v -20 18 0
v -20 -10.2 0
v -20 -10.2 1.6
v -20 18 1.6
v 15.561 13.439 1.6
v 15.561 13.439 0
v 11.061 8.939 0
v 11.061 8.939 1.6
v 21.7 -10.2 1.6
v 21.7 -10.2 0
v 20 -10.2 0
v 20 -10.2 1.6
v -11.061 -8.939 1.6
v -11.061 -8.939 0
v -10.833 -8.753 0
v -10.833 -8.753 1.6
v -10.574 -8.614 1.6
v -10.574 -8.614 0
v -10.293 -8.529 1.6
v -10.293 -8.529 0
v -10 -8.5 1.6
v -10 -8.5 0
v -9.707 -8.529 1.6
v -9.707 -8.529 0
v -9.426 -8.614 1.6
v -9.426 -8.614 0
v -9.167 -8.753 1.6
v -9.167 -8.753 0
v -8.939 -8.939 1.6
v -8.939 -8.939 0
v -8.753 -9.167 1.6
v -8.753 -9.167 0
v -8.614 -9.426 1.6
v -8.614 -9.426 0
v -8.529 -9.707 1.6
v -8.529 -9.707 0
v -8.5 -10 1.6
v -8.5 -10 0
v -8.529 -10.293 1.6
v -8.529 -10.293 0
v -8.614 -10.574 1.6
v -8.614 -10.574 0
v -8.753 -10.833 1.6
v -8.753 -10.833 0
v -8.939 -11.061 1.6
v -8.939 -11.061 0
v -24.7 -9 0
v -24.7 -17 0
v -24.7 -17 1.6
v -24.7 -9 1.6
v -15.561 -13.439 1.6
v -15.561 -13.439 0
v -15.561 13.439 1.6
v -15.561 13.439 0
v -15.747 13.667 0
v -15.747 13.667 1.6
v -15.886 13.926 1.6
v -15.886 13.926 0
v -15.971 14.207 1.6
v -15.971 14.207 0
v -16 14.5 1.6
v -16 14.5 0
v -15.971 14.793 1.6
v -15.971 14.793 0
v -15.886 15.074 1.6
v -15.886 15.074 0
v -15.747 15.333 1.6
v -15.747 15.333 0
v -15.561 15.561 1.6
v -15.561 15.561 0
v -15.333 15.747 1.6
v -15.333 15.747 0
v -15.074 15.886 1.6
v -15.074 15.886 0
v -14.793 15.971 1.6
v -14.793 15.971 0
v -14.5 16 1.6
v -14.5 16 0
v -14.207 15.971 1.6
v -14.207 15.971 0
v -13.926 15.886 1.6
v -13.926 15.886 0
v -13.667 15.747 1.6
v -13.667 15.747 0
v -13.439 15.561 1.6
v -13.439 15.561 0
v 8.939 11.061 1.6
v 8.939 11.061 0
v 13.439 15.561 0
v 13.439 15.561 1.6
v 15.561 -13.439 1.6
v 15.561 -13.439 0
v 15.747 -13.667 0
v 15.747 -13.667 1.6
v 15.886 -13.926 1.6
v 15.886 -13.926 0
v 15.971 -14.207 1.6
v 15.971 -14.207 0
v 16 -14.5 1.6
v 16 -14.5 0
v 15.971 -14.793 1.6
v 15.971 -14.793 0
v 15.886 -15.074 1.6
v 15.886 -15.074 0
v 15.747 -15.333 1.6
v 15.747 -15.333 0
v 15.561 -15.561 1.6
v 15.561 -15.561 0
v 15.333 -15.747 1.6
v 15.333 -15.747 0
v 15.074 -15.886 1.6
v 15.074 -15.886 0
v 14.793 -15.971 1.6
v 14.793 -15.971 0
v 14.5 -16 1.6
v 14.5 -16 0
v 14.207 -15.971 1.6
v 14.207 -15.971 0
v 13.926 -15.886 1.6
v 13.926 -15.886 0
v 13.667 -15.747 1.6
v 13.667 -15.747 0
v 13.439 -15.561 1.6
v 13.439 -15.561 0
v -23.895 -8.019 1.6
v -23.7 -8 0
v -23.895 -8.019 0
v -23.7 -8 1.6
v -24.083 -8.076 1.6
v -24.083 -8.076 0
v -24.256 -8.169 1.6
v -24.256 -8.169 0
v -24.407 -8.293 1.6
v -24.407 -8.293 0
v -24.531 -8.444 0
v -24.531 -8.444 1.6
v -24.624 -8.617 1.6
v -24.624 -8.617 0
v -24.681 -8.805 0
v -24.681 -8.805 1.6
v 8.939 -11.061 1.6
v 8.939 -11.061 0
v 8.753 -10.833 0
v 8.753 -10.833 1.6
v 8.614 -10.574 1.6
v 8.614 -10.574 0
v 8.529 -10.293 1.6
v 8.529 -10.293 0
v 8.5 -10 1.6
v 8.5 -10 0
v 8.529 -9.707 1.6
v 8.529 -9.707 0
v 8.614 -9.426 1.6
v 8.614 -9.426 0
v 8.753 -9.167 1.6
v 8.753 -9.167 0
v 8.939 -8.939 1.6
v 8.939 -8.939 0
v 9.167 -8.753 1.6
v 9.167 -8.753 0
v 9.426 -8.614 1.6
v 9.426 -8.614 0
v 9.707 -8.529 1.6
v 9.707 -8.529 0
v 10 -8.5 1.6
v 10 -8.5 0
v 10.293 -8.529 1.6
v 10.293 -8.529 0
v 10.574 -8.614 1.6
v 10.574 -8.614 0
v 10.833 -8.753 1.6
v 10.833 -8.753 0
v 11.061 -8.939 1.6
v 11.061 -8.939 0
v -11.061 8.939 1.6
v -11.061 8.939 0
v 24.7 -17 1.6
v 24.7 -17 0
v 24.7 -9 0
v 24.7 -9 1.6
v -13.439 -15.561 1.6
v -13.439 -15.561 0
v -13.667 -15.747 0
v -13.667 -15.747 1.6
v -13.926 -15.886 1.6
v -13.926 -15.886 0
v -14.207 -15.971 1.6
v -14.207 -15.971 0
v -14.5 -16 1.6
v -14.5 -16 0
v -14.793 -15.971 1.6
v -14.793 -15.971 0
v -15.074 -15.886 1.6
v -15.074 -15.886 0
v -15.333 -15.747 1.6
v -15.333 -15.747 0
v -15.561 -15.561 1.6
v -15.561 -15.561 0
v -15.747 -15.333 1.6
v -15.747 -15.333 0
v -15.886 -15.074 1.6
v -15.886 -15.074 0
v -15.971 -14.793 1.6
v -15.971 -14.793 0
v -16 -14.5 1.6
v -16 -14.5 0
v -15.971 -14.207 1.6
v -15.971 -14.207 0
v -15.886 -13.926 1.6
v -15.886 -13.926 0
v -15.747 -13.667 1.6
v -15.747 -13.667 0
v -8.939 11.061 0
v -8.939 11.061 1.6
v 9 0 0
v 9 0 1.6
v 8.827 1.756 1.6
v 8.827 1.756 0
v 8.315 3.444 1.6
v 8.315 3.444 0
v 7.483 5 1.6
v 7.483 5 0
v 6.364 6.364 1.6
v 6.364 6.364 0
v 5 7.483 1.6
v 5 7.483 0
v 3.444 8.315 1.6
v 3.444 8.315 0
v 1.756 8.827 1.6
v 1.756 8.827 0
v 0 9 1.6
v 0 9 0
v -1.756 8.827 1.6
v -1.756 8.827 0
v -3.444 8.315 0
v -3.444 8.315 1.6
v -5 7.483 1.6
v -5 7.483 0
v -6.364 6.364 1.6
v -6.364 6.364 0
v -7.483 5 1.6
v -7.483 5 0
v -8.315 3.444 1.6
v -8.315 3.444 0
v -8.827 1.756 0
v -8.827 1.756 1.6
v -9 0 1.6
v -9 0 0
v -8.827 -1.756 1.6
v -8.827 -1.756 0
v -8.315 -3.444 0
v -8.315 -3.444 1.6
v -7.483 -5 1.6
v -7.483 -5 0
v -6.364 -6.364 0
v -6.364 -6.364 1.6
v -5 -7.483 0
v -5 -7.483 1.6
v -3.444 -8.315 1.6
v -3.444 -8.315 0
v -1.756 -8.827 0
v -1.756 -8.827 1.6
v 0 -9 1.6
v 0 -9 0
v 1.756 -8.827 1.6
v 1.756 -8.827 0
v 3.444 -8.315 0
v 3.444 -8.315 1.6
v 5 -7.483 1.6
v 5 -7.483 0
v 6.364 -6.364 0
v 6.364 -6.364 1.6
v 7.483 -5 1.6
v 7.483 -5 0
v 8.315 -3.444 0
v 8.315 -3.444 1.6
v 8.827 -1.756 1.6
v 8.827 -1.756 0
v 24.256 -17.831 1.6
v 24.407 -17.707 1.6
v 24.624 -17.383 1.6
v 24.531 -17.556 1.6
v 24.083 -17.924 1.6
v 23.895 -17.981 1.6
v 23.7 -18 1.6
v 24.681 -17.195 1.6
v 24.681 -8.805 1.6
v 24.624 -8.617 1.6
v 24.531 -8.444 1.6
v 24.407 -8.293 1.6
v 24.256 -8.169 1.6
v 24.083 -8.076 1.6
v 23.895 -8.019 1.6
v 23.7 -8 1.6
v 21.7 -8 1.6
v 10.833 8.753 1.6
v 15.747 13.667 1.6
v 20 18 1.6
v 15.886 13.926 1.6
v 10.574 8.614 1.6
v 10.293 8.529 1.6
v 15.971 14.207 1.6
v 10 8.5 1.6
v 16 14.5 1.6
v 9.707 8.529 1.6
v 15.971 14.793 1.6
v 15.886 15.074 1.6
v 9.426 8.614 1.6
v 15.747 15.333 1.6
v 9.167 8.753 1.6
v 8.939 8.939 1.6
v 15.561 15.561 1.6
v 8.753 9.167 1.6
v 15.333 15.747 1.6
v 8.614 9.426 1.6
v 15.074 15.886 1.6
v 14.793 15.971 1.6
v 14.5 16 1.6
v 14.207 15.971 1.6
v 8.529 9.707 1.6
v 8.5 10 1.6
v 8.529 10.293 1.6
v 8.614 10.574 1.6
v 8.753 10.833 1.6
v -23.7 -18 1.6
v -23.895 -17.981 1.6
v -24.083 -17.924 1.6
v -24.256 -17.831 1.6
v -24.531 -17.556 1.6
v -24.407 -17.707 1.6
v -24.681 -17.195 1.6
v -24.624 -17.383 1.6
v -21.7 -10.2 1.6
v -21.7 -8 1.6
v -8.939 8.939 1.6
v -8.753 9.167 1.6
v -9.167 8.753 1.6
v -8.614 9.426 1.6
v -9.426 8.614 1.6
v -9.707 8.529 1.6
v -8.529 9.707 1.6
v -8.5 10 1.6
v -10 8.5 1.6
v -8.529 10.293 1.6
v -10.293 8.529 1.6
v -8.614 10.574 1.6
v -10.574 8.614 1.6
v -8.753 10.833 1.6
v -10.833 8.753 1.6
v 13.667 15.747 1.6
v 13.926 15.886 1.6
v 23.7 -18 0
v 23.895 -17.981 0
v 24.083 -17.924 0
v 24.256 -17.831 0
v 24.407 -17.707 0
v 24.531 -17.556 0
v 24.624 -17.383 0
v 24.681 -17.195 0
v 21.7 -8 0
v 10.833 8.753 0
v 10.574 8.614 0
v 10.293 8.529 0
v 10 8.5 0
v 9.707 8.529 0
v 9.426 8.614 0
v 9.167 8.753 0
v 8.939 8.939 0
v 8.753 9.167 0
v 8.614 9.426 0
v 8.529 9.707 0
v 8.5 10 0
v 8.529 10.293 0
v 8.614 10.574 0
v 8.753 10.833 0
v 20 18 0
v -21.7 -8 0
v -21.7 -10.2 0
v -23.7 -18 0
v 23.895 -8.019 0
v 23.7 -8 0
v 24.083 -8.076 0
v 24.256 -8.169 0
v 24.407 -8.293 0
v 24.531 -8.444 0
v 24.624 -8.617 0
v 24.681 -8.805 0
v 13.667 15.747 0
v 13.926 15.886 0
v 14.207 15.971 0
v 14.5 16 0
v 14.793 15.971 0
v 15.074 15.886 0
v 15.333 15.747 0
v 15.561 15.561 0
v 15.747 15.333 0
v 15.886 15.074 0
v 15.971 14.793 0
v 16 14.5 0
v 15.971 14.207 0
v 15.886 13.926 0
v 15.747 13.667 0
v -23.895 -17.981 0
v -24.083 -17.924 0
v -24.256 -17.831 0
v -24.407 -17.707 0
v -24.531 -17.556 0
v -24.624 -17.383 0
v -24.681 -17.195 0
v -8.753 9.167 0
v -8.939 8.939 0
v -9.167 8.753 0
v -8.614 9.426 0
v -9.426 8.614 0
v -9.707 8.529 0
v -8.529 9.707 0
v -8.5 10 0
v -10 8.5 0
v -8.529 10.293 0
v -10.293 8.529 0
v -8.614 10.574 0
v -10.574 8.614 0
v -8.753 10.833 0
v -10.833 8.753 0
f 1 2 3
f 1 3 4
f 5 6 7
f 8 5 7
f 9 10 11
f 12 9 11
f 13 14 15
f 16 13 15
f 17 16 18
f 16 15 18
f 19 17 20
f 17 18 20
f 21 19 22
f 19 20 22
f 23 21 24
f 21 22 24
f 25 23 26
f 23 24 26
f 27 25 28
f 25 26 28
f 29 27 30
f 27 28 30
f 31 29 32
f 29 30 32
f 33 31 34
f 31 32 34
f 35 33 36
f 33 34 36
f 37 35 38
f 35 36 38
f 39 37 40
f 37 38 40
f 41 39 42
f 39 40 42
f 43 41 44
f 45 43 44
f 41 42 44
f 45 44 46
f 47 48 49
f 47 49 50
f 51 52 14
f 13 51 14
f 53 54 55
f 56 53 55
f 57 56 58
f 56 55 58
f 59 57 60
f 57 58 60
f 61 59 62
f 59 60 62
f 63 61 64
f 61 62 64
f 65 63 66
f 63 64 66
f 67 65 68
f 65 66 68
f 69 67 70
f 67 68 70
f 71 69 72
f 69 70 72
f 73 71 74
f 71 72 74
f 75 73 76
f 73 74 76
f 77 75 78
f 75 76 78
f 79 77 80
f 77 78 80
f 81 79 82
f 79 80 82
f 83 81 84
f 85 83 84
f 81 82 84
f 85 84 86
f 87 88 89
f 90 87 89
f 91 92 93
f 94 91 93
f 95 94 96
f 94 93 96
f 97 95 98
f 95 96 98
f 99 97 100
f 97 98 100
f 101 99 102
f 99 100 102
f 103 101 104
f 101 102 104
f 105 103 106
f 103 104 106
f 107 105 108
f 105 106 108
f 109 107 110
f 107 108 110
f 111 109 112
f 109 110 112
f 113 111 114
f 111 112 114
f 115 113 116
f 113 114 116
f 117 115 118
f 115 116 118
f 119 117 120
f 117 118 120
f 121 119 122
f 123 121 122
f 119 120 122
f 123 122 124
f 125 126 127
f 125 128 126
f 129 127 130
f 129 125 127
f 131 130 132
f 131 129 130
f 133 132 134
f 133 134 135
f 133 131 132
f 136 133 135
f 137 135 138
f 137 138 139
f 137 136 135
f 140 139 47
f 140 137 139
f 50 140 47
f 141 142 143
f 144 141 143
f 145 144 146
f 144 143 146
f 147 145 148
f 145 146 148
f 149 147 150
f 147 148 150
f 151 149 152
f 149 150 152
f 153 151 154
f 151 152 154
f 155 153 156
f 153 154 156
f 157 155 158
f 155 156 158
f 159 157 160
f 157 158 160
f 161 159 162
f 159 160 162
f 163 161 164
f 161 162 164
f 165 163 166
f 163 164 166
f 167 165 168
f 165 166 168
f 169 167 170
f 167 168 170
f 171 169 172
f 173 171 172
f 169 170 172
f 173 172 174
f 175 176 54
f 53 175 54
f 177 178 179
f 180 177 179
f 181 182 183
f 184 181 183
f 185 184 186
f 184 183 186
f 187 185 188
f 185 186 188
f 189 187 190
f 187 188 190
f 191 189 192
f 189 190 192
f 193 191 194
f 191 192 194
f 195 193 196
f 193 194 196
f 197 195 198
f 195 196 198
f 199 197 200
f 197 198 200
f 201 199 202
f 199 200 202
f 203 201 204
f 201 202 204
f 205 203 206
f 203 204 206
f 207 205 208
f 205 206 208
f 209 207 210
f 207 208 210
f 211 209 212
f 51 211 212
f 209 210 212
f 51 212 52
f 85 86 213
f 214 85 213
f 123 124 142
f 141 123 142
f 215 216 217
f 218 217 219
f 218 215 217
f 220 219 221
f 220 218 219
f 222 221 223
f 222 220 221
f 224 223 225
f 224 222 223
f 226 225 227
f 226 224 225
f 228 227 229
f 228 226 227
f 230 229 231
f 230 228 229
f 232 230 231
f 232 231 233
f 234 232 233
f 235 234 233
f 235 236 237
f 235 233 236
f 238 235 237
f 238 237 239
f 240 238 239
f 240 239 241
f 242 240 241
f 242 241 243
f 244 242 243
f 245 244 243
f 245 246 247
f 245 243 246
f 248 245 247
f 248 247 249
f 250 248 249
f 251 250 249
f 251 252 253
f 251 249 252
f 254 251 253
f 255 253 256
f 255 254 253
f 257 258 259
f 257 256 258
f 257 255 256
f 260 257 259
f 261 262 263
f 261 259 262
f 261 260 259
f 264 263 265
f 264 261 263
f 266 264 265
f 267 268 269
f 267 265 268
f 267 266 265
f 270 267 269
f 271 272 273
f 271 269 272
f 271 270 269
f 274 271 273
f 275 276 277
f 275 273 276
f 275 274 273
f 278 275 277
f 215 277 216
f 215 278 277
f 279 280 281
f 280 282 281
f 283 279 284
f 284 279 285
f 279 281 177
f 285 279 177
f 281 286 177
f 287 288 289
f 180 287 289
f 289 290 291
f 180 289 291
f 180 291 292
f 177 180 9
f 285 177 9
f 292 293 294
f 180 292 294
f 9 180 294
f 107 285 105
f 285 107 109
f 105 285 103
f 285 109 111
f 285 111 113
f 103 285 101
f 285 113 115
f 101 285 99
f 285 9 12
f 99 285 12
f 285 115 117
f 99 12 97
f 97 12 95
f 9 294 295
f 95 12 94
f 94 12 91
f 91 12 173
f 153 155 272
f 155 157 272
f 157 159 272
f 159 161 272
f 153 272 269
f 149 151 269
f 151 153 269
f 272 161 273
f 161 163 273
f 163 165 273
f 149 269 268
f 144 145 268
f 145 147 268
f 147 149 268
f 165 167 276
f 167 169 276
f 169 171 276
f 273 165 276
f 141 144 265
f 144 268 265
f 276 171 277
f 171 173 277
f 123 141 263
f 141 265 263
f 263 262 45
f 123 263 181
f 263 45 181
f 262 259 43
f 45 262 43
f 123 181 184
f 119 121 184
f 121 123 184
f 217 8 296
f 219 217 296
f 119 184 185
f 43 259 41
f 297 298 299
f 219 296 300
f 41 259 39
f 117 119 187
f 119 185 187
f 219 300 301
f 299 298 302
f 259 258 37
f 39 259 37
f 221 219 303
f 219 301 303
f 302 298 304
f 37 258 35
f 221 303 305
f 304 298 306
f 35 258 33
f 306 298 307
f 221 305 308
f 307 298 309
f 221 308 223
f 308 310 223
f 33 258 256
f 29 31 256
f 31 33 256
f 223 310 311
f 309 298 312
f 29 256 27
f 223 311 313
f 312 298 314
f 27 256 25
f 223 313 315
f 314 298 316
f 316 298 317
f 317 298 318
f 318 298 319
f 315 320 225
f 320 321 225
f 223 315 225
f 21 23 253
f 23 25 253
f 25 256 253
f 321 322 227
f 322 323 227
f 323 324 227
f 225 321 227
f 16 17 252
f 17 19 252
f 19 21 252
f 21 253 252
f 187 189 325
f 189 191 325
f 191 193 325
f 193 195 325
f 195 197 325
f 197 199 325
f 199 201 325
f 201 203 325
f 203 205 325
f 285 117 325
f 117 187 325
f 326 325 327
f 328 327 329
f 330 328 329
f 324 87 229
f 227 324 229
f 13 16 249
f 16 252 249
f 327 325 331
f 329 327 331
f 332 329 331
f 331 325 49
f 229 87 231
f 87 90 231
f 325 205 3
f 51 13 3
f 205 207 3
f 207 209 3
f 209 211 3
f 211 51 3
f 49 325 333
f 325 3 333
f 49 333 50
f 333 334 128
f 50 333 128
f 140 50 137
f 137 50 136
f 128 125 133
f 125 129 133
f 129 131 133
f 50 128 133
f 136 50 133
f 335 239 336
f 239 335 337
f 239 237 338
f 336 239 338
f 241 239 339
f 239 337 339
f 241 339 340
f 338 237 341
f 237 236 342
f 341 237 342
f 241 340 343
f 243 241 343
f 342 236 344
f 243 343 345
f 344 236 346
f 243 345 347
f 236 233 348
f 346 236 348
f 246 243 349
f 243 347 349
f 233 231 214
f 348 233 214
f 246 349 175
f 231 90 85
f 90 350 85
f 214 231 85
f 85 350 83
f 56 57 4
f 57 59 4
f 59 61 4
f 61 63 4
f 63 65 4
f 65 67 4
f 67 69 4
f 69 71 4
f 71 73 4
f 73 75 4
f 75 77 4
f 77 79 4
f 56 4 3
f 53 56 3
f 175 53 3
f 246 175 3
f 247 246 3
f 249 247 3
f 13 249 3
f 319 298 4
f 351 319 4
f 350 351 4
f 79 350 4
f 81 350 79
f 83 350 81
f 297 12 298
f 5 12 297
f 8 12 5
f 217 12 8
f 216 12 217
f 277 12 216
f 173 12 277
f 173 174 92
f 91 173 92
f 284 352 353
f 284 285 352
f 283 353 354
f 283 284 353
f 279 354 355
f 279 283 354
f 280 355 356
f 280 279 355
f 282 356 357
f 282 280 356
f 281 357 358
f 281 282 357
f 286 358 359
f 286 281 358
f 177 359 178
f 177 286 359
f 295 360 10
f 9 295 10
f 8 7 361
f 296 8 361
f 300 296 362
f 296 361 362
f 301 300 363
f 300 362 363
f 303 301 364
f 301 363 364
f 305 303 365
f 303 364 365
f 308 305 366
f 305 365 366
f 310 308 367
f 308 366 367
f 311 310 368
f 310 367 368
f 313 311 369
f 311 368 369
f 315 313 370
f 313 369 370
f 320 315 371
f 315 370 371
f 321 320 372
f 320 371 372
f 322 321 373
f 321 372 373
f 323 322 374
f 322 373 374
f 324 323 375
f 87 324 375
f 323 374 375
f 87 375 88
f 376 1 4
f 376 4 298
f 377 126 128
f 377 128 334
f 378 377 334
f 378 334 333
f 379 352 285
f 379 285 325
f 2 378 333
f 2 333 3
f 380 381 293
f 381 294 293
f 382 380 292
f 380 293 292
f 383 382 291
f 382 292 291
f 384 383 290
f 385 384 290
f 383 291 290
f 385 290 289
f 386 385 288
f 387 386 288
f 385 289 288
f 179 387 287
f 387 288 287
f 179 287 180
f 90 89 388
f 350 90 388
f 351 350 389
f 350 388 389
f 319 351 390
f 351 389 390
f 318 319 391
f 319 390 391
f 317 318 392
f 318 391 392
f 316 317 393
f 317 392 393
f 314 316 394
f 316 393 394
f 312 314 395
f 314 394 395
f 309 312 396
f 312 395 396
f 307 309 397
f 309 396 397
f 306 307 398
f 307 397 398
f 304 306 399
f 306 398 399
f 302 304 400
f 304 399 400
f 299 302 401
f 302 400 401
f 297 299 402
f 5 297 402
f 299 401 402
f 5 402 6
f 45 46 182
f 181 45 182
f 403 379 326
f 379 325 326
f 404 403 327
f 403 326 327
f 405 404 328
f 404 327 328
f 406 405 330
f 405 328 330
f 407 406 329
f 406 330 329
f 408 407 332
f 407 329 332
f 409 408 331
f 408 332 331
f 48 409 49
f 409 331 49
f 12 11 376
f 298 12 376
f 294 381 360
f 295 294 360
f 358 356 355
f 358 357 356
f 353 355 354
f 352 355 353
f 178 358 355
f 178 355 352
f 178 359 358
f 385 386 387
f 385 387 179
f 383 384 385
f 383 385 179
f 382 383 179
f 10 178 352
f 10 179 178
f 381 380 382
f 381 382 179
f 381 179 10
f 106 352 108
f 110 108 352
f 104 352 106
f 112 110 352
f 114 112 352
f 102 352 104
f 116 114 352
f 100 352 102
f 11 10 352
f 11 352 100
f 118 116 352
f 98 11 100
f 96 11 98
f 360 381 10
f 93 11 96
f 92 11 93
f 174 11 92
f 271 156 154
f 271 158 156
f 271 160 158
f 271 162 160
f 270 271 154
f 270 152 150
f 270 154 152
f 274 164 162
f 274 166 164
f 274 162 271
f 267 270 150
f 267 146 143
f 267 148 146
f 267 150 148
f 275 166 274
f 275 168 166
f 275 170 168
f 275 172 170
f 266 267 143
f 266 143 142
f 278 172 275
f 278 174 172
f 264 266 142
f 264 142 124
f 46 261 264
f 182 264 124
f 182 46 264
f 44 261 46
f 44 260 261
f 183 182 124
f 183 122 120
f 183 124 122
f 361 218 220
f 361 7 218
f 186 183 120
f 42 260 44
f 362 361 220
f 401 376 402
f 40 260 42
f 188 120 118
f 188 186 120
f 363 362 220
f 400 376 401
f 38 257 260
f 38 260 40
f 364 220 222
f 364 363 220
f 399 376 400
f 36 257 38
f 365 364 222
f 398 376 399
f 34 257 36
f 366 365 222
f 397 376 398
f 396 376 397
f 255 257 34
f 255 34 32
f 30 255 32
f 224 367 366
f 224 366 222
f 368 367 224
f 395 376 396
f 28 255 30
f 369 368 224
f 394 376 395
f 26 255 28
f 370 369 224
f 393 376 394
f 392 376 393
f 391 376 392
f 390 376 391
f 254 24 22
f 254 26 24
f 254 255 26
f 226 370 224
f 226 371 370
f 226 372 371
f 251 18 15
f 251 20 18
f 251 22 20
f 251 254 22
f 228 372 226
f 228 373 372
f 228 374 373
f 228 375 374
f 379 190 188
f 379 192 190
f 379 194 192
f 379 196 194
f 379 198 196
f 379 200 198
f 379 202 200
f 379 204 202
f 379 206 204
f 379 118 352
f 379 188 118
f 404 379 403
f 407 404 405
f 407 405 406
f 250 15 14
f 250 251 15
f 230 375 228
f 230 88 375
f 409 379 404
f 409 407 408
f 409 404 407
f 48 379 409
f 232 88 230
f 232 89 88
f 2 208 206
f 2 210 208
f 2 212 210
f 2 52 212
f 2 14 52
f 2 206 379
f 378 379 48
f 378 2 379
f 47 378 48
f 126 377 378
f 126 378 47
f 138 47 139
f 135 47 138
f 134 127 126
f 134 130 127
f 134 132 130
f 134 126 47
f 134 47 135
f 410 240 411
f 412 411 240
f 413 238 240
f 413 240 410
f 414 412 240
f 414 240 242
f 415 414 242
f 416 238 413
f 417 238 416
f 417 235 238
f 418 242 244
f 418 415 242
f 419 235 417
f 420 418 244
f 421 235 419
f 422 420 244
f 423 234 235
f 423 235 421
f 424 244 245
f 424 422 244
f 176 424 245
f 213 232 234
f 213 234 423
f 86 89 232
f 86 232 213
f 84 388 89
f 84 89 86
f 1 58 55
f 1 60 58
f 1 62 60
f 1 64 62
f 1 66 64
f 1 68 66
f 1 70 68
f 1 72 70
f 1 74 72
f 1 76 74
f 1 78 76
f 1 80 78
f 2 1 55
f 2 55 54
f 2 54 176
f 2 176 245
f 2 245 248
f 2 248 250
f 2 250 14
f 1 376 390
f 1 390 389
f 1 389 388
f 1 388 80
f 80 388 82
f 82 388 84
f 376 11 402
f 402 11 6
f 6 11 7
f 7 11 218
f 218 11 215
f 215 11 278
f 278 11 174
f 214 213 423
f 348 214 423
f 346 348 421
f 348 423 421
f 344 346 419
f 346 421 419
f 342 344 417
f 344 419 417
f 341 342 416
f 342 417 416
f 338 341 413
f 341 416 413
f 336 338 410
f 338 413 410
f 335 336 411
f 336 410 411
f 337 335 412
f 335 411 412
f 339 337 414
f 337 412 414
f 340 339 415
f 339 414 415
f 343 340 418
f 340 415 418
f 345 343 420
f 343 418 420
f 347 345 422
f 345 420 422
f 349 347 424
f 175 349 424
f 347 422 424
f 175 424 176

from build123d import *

# Parameters (mm, degrees)
SKETCH1_W           = 40
SKETCH1_H           = 36
BOSS_EXTRUDE1_DEPTH = 1.6
LENSE_HOLE_R        = 9
CUT_EXTRUDE1_DEPTH  = 27.954776942
CUT_EXTRUDE2_DEPTH  = 27.954776942
BOSS_EXTRUDE2_DEPTH = 1.6
FILLET1_R           = 1


with BuildPart() as part:
    # Sketch1 → Boss-Extrude1 (new body)
    with BuildSketch(Plane.XY):
        Rectangle(SKETCH1_W, SKETCH1_H)
    extrude(amount=BOSS_EXTRUDE1_DEPTH)

    # lense hole → Cut-Extrude1 (cut, through all)
    with BuildSketch(Plane.XY):
        Circle(LENSE_HOLE_R)
    extrude(amount=CUT_EXTRUDE1_DEPTH, mode=Mode.SUBTRACT)

    # Sketch4 → Cut-Extrude2 (cut, through all)
    with BuildSketch(Plane.XY):
        with BuildLine():
            Line((-13.439339828, 15.560660172), (-8.939339828, 11.060660172))
            ThreePointArc((-8.939339828, 11.060660172), (-8.939339828, 8.939339828), (-11.060660172, 8.939339828))
            Line((-11.060660172, 8.939339828), (-15.560660172, 13.439339828))
            ThreePointArc((-15.560660172, 13.439339828), (-15.560660172, 15.560660172), (-13.439339828, 15.560660172))
        make_face()
        with BuildLine():
            Line((8.939339828, 11.060660172), (13.439339828, 15.560660172))
            ThreePointArc((13.439339828, 15.560660172), (15.560660172, 15.560660172), (15.560660172, 13.439339828))
            Line((15.560660172, 13.439339828), (11.060660172, 8.939339828))
            ThreePointArc((11.060660172, 8.939339828), (8.939339828, 8.939339828), (8.939339828, 11.060660172))
        make_face()
        with BuildLine():
            Line((11.060660172, -8.939339828), (15.560660172, -13.439339828))
            ThreePointArc((15.560660172, -13.439339828), (15.560660172, -15.560660172), (13.439339828, -15.560660172))
            Line((13.439339828, -15.560660172), (8.939339828, -11.060660172))
            ThreePointArc((8.939339828, -11.060660172), (8.939339828, -8.939339828), (11.060660172, -8.939339828))
        make_face()
        with BuildLine():
            Line((-15.560660172, -13.439339828), (-11.060660172, -8.939339828))
            ThreePointArc((-11.060660172, -8.939339828), (-8.939339828, -8.939339828), (-8.939339828, -11.060660172))
            Line((-8.939339828, -11.060660172), (-13.439339828, -15.560660172))
            ThreePointArc((-13.439339828, -15.560660172), (-15.560660172, -15.560660172), (-15.560660172, -13.439339828))
        make_face()
    extrude(amount=CUT_EXTRUDE2_DEPTH, mode=Mode.SUBTRACT)

    # Sketch5 → Boss-Extrude2 (add)
    with BuildSketch(Plane.XY):
        Polygon((20, -18), (24.7, -18), (24.7, -8), (21.7, -8), (21.7, -10.2), (20, -10.2), align=None)
    boss_extrude2 = extrude(amount=BOSS_EXTRUDE2_DEPTH)

    # Mirror1: Boss-Extrude2 across plane
    add(boss_extrude2.mirror(Plane(origin=(0, 0, 0), x_dir=(0, 0, 1), z_dir=(1, 0, 0))))

    # Fillet1
    fillet1_edges = [part.edges().sort_by_distance(p)[0] for p in [
        (24.7, -18, 0.8),
        (24.7, -8, 0.8),
        (-24.7, -18, 0.8),
        (-24.7, -8, 0.8),
    ]]
    fillet(fillet1_edges, radius=FILLET1_R)


solid = part.part
